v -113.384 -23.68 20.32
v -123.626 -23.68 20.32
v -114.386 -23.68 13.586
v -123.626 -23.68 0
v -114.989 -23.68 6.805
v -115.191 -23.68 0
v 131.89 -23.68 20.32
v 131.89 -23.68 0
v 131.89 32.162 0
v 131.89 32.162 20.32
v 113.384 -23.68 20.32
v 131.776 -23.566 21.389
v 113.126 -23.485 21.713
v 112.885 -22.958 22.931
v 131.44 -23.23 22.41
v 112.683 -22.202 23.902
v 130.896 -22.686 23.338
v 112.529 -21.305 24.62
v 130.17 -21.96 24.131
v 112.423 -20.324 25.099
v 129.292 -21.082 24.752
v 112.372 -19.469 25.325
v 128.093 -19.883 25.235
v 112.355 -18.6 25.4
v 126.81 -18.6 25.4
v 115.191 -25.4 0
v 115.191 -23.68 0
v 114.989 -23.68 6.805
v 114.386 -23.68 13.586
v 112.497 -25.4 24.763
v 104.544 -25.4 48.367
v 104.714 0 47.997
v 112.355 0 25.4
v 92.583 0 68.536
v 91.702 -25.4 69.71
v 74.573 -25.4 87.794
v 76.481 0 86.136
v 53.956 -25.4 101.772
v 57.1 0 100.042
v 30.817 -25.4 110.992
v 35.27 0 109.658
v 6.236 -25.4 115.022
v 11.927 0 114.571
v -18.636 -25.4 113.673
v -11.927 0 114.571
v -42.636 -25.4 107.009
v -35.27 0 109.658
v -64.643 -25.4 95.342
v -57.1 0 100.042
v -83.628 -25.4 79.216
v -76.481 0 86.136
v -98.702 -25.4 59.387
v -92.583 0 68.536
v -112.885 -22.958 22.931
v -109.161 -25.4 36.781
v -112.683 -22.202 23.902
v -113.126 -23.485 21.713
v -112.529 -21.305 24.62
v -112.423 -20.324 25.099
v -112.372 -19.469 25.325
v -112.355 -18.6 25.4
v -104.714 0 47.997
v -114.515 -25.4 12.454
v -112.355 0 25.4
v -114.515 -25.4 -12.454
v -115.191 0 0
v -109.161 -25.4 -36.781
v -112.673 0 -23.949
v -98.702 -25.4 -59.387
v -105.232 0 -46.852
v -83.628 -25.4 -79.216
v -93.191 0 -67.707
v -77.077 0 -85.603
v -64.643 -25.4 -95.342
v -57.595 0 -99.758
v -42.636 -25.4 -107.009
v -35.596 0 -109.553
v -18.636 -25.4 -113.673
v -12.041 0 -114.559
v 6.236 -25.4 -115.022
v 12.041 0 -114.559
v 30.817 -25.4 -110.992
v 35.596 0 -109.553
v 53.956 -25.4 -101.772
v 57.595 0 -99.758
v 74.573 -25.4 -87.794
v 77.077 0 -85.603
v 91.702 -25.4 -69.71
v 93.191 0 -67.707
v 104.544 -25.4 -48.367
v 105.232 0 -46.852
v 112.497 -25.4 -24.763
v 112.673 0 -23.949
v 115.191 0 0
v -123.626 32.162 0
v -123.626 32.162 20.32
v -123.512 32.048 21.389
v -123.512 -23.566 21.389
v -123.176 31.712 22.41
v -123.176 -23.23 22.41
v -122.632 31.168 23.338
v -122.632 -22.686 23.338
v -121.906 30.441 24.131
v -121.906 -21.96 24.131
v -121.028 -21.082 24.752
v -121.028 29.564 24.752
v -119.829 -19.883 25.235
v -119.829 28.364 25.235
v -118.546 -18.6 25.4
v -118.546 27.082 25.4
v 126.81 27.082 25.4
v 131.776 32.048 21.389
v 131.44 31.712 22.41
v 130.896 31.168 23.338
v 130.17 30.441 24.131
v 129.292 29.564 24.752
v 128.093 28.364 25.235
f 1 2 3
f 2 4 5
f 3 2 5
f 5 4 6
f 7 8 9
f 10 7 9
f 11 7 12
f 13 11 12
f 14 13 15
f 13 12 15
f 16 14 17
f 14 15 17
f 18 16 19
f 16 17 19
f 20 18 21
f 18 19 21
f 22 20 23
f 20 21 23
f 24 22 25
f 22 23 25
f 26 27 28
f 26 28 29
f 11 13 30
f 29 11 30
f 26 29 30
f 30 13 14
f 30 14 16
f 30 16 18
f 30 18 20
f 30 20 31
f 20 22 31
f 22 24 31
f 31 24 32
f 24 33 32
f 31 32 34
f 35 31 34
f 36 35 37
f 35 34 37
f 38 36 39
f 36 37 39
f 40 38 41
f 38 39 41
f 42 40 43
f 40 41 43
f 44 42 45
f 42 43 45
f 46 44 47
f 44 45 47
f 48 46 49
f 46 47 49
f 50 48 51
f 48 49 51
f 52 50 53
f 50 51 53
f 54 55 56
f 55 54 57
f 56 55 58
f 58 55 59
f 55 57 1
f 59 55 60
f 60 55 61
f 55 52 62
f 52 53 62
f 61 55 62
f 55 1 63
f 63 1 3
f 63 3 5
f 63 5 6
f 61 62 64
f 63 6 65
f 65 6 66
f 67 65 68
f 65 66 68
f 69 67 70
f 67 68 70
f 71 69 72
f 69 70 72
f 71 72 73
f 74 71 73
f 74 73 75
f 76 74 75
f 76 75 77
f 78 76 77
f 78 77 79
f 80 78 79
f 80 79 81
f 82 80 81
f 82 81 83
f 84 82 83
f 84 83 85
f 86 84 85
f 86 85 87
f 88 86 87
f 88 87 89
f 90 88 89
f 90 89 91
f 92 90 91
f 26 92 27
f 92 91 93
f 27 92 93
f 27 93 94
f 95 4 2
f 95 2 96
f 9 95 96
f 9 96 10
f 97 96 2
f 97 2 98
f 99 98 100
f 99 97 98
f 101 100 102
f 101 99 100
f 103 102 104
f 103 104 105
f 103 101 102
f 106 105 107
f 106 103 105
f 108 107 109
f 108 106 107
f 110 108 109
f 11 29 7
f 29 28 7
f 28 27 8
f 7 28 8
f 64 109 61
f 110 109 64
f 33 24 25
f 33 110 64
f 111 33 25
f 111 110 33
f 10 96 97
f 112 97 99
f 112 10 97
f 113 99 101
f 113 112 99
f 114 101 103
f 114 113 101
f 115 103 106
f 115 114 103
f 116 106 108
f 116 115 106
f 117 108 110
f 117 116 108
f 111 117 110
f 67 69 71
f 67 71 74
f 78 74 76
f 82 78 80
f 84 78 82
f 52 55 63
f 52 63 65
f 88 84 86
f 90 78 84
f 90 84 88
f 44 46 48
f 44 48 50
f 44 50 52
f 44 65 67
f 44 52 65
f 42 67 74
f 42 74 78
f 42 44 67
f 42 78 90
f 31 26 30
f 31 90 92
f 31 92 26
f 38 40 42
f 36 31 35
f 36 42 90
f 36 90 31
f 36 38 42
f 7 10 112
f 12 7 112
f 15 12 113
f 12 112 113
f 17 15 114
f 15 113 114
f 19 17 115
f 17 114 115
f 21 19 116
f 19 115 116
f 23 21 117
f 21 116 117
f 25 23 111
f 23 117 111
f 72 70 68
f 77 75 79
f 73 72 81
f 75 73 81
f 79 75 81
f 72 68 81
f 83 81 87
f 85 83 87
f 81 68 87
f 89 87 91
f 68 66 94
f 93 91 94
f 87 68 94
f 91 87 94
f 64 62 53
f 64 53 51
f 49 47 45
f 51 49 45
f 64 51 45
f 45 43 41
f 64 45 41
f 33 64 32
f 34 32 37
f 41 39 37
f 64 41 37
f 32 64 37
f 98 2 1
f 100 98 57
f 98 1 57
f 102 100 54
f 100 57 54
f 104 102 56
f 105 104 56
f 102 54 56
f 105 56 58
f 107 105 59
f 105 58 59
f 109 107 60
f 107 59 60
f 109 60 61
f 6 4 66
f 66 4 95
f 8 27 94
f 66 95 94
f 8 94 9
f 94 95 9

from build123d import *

# Parameters (mm, degrees)
F0_W     = 255.5162906647
F0_H     = 55.8418184519
F1_DEPTH = 25.4
F2_R     = 5.08
F3_R     = 115.1905151489
F4_DEPTH = 25.4


with BuildPart() as f1:
    # F0 (on Top) → F1 (new body)
    with BuildSketch(Plane.XY):
        with Locations((4.1319578886, 4.2407922447)):
            Rectangle(F0_W, F0_H)
    extrude(amount=F1_DEPTH)

    # F2
    f2_edges = [f1.edges().sort_by_distance(p)[0] for p in [
        (-123.626187, 4.240792, 25.4),
        (4.131958, -23.680117, 25.4),
        (131.890103, 4.240792, 25.4),
        (4.131958, 32.161701, 25.4),
    ]]
    fillet(f2_edges, radius=F2_R)

    # F3 (on Front) → F4 (join)
    with BuildSketch(Plane.XZ):
        Circle(F3_R)
    extrude(amount=F4_DEPTH)


solid = f1.part
